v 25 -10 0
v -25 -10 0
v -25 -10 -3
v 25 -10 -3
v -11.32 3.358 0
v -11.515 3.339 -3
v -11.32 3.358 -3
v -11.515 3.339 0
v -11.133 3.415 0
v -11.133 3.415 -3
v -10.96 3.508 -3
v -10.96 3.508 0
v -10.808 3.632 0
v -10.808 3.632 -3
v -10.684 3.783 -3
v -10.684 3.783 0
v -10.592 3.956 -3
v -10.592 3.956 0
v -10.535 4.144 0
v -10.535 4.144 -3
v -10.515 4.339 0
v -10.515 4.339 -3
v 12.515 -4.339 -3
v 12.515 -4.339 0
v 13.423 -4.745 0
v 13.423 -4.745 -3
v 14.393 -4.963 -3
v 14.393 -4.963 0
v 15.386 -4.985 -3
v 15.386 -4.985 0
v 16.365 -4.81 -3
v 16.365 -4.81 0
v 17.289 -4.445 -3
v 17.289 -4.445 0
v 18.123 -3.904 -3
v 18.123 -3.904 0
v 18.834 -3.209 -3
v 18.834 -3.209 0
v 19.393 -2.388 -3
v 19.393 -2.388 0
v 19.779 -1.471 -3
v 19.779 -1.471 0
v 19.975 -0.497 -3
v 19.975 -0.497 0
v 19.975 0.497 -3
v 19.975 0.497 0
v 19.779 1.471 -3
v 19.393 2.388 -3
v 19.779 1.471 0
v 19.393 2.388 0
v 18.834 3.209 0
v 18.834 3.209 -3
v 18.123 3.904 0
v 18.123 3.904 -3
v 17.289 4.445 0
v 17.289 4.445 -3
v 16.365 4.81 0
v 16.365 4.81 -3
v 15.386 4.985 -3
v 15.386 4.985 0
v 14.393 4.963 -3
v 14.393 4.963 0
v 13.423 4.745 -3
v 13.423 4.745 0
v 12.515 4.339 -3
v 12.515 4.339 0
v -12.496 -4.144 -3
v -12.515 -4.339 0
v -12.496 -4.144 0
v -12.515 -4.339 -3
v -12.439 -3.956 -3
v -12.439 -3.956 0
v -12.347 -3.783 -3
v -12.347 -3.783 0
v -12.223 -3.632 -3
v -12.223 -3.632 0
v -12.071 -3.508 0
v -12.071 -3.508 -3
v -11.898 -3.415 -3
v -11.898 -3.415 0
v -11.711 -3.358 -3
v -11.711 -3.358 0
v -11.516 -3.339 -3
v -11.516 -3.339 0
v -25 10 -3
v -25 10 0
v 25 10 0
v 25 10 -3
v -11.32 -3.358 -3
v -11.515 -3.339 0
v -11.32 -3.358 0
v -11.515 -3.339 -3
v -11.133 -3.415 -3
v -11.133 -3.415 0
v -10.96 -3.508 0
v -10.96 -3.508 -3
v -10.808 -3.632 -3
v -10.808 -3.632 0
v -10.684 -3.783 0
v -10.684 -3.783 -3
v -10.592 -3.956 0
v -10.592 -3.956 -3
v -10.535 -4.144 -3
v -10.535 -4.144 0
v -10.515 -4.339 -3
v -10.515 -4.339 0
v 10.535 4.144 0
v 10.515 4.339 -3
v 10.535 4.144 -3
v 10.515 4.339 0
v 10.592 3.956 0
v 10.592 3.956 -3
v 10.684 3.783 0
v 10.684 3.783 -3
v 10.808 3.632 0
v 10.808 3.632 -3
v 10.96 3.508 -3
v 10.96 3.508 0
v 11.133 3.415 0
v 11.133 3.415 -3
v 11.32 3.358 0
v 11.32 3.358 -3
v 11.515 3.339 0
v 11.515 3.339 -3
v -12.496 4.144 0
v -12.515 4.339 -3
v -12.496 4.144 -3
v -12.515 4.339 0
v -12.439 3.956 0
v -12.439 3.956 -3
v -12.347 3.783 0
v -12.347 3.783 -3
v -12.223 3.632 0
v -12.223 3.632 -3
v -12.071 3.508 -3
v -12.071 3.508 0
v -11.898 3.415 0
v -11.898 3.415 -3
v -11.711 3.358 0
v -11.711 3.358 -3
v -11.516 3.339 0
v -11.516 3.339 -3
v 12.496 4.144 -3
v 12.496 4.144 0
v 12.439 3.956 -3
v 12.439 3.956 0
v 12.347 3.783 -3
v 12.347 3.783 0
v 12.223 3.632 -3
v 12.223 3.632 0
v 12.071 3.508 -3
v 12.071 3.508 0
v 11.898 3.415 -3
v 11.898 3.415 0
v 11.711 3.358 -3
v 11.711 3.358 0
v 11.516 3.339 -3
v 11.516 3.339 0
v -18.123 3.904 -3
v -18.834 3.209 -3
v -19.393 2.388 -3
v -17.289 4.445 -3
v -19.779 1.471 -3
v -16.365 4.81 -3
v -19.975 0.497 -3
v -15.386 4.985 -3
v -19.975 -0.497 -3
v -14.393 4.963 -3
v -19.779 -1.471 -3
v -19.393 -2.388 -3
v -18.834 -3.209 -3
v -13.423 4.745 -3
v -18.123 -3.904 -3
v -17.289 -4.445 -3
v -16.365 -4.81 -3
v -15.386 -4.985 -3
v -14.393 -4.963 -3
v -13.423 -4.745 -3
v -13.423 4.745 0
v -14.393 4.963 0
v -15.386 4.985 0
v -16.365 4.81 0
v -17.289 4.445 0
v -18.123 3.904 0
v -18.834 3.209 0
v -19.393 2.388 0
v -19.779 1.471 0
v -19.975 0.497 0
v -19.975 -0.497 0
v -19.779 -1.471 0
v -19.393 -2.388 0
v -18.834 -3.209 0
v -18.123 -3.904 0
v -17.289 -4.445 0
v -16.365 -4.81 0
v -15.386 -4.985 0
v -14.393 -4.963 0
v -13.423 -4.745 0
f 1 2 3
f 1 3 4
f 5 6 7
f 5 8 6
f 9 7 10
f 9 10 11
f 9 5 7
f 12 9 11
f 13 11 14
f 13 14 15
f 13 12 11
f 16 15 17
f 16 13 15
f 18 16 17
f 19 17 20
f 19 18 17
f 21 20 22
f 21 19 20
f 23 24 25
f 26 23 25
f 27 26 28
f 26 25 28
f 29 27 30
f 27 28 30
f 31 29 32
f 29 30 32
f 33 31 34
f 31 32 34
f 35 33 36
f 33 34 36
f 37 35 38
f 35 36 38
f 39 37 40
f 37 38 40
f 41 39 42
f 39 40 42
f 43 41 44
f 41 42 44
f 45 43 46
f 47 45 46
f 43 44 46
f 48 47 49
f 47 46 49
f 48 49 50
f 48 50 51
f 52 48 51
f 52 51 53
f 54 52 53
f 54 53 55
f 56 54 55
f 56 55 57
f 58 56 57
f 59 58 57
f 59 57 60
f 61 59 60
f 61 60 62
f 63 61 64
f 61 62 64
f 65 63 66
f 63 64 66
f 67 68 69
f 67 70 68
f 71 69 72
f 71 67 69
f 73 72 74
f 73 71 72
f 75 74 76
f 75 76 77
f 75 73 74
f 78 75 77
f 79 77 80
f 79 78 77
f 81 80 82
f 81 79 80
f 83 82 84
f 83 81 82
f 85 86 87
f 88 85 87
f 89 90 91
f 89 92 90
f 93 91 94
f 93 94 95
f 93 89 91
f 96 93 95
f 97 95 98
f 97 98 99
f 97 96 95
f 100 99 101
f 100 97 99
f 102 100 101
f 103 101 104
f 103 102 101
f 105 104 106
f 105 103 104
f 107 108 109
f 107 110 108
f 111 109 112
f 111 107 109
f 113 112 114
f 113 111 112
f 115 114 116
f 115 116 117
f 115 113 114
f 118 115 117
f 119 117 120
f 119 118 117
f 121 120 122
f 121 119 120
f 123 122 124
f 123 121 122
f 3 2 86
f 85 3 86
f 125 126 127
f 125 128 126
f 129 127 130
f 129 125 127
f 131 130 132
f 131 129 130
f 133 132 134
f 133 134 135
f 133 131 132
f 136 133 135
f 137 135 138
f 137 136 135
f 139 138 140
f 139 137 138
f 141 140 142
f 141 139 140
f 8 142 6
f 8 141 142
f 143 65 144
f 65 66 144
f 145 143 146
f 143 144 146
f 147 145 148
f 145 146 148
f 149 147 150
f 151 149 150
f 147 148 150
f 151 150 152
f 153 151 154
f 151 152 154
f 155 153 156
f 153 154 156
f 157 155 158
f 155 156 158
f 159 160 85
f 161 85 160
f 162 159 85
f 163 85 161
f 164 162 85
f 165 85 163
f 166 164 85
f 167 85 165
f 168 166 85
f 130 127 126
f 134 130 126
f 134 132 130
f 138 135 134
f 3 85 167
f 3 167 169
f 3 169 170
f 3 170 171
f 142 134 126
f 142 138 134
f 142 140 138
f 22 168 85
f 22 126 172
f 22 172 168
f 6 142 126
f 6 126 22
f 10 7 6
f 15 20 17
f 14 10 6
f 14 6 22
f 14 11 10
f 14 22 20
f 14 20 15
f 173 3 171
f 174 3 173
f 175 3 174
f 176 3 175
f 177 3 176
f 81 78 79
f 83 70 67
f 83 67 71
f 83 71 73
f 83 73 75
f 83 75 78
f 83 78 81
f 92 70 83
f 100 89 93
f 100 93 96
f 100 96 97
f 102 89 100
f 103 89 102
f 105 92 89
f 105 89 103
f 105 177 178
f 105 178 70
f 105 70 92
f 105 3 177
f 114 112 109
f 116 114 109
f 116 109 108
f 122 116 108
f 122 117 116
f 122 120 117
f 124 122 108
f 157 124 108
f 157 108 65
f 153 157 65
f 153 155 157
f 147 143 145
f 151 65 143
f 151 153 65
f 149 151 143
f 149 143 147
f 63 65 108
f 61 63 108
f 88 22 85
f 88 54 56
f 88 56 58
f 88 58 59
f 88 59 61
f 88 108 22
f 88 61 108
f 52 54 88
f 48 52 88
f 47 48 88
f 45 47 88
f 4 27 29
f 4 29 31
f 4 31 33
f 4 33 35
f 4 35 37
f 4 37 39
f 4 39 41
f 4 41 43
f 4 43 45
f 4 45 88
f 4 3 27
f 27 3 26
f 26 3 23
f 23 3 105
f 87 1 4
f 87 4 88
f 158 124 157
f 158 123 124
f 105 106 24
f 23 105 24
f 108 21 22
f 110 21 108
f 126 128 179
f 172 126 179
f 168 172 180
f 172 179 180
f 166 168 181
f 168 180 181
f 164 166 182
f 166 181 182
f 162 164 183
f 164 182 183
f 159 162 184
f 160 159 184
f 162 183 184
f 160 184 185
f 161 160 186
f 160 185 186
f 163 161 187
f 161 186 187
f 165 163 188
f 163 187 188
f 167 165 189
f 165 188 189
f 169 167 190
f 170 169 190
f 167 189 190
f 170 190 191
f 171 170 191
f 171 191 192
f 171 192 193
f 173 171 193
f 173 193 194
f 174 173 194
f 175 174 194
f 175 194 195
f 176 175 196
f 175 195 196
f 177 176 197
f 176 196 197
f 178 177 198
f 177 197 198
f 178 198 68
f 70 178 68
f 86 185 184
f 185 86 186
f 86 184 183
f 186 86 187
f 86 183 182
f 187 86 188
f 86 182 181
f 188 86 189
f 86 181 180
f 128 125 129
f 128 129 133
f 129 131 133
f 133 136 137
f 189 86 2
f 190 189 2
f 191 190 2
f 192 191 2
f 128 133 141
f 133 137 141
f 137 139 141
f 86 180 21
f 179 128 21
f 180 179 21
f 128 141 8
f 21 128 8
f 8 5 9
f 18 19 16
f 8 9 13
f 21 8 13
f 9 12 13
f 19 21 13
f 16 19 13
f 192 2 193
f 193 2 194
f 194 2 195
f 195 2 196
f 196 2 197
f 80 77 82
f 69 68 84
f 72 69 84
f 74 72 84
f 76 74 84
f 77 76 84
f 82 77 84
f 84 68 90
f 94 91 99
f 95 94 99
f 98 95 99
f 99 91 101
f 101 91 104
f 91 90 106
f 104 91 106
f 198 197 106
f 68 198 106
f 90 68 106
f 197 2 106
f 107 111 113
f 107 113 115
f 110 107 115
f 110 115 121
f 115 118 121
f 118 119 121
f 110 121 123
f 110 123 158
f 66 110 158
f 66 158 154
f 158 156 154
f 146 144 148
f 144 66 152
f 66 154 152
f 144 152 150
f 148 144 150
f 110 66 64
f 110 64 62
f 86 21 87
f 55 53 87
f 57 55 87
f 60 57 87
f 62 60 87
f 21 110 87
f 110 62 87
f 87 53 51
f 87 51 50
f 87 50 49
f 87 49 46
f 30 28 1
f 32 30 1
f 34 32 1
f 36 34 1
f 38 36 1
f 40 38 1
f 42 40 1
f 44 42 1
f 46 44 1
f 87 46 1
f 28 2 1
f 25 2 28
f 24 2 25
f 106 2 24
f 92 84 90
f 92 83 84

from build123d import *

# Parameters (mm, degrees)
SKETCH_1_W          = 50
SKETCH_1_H          = 20
EXTRUDE_1_DEPTH     = 3
SKETCH_3_R          = 5
SKETCH_3_W          = 30
SKETCH_3_H          = 8.678040074
CUT_EXTRUDE_1_DEPTH = 3
SKETCH_4_W          = 2
SKETCH_4_H          = 3
EXTRUDE_2_DEPTH     = 1
FILLET_1_R          = 1
SKETCH_5_W          = 2
SKETCH_5_H          = 3
EXTRUDE_3_DEPTH     = 1
FILLET_2_R          = 1


with BuildPart() as part:
    # 스케치1 → 보스-돌출1 (new body)
    with BuildSketch(Plane.XY):
        Rectangle(SKETCH_1_W, SKETCH_1_H)
    extrude(amount=-EXTRUDE_1_DEPTH)

    # 스케치3 → 컷-돌출1 (cut)
    with BuildSketch(Plane.XY):
        with Locations((-15, 0)):
            Circle(SKETCH_3_R)
        with Locations((15, 0)):
            Circle(SKETCH_3_R)
        Rectangle(SKETCH_3_W, SKETCH_3_H)
    extrude(amount=-CUT_EXTRUDE_1_DEPTH, mode=Mode.SUBTRACT)

    # 스케치4 → 보스-돌출2 (add)
    with BuildSketch(Plane.XZ.offset(-4.339020037)):
        with Locations((-11.515466821, -1.5)):
            Rectangle(SKETCH_4_W, SKETCH_4_H)
        with Locations((11.515466821, -1.5)):
            Rectangle(SKETCH_4_W, SKETCH_4_H)
    extrude(amount=EXTRUDE_2_DEPTH)

    # 필렛1
    fillet_1_edges = [part.edges().sort_by_distance(p)[0] for p in [
        (12.515466821, 3.339020037, -1.5),
        (10.515466821, 3.339020037, -1.5),
        (-10.515466821, 3.339020037, -1.5),
        (-12.515466821, 3.339020037, -1.5),
    ]]
    fillet(fillet_1_edges, radius=FILLET_1_R - 0.0001)  # a hair under: the kernel refuses the full size

    # 스케치5 → 보스-돌출3 (add)
    with BuildSketch(Plane(origin=(0, -4.339020037, 0), x_dir=(1, 0, 0), z_dir=(0, 1, 0))):
        with Locations((-11.515466821, 1.5)):
            Rectangle(SKETCH_5_W, SKETCH_5_H)
    extrude(amount=EXTRUDE_3_DEPTH)

    # 필렛2
    fillet_2_edges = [part.edges().sort_by_distance(p)[0] for p in [
        (-12.515466821, -3.339020037, -1.5),
        (-10.515466821, -3.339020037, -1.5),
    ]]
    fillet(fillet_2_edges, radius=FILLET_2_R - 0.0001)  # a hair under: the kernel refuses the full size


solid = part.part
